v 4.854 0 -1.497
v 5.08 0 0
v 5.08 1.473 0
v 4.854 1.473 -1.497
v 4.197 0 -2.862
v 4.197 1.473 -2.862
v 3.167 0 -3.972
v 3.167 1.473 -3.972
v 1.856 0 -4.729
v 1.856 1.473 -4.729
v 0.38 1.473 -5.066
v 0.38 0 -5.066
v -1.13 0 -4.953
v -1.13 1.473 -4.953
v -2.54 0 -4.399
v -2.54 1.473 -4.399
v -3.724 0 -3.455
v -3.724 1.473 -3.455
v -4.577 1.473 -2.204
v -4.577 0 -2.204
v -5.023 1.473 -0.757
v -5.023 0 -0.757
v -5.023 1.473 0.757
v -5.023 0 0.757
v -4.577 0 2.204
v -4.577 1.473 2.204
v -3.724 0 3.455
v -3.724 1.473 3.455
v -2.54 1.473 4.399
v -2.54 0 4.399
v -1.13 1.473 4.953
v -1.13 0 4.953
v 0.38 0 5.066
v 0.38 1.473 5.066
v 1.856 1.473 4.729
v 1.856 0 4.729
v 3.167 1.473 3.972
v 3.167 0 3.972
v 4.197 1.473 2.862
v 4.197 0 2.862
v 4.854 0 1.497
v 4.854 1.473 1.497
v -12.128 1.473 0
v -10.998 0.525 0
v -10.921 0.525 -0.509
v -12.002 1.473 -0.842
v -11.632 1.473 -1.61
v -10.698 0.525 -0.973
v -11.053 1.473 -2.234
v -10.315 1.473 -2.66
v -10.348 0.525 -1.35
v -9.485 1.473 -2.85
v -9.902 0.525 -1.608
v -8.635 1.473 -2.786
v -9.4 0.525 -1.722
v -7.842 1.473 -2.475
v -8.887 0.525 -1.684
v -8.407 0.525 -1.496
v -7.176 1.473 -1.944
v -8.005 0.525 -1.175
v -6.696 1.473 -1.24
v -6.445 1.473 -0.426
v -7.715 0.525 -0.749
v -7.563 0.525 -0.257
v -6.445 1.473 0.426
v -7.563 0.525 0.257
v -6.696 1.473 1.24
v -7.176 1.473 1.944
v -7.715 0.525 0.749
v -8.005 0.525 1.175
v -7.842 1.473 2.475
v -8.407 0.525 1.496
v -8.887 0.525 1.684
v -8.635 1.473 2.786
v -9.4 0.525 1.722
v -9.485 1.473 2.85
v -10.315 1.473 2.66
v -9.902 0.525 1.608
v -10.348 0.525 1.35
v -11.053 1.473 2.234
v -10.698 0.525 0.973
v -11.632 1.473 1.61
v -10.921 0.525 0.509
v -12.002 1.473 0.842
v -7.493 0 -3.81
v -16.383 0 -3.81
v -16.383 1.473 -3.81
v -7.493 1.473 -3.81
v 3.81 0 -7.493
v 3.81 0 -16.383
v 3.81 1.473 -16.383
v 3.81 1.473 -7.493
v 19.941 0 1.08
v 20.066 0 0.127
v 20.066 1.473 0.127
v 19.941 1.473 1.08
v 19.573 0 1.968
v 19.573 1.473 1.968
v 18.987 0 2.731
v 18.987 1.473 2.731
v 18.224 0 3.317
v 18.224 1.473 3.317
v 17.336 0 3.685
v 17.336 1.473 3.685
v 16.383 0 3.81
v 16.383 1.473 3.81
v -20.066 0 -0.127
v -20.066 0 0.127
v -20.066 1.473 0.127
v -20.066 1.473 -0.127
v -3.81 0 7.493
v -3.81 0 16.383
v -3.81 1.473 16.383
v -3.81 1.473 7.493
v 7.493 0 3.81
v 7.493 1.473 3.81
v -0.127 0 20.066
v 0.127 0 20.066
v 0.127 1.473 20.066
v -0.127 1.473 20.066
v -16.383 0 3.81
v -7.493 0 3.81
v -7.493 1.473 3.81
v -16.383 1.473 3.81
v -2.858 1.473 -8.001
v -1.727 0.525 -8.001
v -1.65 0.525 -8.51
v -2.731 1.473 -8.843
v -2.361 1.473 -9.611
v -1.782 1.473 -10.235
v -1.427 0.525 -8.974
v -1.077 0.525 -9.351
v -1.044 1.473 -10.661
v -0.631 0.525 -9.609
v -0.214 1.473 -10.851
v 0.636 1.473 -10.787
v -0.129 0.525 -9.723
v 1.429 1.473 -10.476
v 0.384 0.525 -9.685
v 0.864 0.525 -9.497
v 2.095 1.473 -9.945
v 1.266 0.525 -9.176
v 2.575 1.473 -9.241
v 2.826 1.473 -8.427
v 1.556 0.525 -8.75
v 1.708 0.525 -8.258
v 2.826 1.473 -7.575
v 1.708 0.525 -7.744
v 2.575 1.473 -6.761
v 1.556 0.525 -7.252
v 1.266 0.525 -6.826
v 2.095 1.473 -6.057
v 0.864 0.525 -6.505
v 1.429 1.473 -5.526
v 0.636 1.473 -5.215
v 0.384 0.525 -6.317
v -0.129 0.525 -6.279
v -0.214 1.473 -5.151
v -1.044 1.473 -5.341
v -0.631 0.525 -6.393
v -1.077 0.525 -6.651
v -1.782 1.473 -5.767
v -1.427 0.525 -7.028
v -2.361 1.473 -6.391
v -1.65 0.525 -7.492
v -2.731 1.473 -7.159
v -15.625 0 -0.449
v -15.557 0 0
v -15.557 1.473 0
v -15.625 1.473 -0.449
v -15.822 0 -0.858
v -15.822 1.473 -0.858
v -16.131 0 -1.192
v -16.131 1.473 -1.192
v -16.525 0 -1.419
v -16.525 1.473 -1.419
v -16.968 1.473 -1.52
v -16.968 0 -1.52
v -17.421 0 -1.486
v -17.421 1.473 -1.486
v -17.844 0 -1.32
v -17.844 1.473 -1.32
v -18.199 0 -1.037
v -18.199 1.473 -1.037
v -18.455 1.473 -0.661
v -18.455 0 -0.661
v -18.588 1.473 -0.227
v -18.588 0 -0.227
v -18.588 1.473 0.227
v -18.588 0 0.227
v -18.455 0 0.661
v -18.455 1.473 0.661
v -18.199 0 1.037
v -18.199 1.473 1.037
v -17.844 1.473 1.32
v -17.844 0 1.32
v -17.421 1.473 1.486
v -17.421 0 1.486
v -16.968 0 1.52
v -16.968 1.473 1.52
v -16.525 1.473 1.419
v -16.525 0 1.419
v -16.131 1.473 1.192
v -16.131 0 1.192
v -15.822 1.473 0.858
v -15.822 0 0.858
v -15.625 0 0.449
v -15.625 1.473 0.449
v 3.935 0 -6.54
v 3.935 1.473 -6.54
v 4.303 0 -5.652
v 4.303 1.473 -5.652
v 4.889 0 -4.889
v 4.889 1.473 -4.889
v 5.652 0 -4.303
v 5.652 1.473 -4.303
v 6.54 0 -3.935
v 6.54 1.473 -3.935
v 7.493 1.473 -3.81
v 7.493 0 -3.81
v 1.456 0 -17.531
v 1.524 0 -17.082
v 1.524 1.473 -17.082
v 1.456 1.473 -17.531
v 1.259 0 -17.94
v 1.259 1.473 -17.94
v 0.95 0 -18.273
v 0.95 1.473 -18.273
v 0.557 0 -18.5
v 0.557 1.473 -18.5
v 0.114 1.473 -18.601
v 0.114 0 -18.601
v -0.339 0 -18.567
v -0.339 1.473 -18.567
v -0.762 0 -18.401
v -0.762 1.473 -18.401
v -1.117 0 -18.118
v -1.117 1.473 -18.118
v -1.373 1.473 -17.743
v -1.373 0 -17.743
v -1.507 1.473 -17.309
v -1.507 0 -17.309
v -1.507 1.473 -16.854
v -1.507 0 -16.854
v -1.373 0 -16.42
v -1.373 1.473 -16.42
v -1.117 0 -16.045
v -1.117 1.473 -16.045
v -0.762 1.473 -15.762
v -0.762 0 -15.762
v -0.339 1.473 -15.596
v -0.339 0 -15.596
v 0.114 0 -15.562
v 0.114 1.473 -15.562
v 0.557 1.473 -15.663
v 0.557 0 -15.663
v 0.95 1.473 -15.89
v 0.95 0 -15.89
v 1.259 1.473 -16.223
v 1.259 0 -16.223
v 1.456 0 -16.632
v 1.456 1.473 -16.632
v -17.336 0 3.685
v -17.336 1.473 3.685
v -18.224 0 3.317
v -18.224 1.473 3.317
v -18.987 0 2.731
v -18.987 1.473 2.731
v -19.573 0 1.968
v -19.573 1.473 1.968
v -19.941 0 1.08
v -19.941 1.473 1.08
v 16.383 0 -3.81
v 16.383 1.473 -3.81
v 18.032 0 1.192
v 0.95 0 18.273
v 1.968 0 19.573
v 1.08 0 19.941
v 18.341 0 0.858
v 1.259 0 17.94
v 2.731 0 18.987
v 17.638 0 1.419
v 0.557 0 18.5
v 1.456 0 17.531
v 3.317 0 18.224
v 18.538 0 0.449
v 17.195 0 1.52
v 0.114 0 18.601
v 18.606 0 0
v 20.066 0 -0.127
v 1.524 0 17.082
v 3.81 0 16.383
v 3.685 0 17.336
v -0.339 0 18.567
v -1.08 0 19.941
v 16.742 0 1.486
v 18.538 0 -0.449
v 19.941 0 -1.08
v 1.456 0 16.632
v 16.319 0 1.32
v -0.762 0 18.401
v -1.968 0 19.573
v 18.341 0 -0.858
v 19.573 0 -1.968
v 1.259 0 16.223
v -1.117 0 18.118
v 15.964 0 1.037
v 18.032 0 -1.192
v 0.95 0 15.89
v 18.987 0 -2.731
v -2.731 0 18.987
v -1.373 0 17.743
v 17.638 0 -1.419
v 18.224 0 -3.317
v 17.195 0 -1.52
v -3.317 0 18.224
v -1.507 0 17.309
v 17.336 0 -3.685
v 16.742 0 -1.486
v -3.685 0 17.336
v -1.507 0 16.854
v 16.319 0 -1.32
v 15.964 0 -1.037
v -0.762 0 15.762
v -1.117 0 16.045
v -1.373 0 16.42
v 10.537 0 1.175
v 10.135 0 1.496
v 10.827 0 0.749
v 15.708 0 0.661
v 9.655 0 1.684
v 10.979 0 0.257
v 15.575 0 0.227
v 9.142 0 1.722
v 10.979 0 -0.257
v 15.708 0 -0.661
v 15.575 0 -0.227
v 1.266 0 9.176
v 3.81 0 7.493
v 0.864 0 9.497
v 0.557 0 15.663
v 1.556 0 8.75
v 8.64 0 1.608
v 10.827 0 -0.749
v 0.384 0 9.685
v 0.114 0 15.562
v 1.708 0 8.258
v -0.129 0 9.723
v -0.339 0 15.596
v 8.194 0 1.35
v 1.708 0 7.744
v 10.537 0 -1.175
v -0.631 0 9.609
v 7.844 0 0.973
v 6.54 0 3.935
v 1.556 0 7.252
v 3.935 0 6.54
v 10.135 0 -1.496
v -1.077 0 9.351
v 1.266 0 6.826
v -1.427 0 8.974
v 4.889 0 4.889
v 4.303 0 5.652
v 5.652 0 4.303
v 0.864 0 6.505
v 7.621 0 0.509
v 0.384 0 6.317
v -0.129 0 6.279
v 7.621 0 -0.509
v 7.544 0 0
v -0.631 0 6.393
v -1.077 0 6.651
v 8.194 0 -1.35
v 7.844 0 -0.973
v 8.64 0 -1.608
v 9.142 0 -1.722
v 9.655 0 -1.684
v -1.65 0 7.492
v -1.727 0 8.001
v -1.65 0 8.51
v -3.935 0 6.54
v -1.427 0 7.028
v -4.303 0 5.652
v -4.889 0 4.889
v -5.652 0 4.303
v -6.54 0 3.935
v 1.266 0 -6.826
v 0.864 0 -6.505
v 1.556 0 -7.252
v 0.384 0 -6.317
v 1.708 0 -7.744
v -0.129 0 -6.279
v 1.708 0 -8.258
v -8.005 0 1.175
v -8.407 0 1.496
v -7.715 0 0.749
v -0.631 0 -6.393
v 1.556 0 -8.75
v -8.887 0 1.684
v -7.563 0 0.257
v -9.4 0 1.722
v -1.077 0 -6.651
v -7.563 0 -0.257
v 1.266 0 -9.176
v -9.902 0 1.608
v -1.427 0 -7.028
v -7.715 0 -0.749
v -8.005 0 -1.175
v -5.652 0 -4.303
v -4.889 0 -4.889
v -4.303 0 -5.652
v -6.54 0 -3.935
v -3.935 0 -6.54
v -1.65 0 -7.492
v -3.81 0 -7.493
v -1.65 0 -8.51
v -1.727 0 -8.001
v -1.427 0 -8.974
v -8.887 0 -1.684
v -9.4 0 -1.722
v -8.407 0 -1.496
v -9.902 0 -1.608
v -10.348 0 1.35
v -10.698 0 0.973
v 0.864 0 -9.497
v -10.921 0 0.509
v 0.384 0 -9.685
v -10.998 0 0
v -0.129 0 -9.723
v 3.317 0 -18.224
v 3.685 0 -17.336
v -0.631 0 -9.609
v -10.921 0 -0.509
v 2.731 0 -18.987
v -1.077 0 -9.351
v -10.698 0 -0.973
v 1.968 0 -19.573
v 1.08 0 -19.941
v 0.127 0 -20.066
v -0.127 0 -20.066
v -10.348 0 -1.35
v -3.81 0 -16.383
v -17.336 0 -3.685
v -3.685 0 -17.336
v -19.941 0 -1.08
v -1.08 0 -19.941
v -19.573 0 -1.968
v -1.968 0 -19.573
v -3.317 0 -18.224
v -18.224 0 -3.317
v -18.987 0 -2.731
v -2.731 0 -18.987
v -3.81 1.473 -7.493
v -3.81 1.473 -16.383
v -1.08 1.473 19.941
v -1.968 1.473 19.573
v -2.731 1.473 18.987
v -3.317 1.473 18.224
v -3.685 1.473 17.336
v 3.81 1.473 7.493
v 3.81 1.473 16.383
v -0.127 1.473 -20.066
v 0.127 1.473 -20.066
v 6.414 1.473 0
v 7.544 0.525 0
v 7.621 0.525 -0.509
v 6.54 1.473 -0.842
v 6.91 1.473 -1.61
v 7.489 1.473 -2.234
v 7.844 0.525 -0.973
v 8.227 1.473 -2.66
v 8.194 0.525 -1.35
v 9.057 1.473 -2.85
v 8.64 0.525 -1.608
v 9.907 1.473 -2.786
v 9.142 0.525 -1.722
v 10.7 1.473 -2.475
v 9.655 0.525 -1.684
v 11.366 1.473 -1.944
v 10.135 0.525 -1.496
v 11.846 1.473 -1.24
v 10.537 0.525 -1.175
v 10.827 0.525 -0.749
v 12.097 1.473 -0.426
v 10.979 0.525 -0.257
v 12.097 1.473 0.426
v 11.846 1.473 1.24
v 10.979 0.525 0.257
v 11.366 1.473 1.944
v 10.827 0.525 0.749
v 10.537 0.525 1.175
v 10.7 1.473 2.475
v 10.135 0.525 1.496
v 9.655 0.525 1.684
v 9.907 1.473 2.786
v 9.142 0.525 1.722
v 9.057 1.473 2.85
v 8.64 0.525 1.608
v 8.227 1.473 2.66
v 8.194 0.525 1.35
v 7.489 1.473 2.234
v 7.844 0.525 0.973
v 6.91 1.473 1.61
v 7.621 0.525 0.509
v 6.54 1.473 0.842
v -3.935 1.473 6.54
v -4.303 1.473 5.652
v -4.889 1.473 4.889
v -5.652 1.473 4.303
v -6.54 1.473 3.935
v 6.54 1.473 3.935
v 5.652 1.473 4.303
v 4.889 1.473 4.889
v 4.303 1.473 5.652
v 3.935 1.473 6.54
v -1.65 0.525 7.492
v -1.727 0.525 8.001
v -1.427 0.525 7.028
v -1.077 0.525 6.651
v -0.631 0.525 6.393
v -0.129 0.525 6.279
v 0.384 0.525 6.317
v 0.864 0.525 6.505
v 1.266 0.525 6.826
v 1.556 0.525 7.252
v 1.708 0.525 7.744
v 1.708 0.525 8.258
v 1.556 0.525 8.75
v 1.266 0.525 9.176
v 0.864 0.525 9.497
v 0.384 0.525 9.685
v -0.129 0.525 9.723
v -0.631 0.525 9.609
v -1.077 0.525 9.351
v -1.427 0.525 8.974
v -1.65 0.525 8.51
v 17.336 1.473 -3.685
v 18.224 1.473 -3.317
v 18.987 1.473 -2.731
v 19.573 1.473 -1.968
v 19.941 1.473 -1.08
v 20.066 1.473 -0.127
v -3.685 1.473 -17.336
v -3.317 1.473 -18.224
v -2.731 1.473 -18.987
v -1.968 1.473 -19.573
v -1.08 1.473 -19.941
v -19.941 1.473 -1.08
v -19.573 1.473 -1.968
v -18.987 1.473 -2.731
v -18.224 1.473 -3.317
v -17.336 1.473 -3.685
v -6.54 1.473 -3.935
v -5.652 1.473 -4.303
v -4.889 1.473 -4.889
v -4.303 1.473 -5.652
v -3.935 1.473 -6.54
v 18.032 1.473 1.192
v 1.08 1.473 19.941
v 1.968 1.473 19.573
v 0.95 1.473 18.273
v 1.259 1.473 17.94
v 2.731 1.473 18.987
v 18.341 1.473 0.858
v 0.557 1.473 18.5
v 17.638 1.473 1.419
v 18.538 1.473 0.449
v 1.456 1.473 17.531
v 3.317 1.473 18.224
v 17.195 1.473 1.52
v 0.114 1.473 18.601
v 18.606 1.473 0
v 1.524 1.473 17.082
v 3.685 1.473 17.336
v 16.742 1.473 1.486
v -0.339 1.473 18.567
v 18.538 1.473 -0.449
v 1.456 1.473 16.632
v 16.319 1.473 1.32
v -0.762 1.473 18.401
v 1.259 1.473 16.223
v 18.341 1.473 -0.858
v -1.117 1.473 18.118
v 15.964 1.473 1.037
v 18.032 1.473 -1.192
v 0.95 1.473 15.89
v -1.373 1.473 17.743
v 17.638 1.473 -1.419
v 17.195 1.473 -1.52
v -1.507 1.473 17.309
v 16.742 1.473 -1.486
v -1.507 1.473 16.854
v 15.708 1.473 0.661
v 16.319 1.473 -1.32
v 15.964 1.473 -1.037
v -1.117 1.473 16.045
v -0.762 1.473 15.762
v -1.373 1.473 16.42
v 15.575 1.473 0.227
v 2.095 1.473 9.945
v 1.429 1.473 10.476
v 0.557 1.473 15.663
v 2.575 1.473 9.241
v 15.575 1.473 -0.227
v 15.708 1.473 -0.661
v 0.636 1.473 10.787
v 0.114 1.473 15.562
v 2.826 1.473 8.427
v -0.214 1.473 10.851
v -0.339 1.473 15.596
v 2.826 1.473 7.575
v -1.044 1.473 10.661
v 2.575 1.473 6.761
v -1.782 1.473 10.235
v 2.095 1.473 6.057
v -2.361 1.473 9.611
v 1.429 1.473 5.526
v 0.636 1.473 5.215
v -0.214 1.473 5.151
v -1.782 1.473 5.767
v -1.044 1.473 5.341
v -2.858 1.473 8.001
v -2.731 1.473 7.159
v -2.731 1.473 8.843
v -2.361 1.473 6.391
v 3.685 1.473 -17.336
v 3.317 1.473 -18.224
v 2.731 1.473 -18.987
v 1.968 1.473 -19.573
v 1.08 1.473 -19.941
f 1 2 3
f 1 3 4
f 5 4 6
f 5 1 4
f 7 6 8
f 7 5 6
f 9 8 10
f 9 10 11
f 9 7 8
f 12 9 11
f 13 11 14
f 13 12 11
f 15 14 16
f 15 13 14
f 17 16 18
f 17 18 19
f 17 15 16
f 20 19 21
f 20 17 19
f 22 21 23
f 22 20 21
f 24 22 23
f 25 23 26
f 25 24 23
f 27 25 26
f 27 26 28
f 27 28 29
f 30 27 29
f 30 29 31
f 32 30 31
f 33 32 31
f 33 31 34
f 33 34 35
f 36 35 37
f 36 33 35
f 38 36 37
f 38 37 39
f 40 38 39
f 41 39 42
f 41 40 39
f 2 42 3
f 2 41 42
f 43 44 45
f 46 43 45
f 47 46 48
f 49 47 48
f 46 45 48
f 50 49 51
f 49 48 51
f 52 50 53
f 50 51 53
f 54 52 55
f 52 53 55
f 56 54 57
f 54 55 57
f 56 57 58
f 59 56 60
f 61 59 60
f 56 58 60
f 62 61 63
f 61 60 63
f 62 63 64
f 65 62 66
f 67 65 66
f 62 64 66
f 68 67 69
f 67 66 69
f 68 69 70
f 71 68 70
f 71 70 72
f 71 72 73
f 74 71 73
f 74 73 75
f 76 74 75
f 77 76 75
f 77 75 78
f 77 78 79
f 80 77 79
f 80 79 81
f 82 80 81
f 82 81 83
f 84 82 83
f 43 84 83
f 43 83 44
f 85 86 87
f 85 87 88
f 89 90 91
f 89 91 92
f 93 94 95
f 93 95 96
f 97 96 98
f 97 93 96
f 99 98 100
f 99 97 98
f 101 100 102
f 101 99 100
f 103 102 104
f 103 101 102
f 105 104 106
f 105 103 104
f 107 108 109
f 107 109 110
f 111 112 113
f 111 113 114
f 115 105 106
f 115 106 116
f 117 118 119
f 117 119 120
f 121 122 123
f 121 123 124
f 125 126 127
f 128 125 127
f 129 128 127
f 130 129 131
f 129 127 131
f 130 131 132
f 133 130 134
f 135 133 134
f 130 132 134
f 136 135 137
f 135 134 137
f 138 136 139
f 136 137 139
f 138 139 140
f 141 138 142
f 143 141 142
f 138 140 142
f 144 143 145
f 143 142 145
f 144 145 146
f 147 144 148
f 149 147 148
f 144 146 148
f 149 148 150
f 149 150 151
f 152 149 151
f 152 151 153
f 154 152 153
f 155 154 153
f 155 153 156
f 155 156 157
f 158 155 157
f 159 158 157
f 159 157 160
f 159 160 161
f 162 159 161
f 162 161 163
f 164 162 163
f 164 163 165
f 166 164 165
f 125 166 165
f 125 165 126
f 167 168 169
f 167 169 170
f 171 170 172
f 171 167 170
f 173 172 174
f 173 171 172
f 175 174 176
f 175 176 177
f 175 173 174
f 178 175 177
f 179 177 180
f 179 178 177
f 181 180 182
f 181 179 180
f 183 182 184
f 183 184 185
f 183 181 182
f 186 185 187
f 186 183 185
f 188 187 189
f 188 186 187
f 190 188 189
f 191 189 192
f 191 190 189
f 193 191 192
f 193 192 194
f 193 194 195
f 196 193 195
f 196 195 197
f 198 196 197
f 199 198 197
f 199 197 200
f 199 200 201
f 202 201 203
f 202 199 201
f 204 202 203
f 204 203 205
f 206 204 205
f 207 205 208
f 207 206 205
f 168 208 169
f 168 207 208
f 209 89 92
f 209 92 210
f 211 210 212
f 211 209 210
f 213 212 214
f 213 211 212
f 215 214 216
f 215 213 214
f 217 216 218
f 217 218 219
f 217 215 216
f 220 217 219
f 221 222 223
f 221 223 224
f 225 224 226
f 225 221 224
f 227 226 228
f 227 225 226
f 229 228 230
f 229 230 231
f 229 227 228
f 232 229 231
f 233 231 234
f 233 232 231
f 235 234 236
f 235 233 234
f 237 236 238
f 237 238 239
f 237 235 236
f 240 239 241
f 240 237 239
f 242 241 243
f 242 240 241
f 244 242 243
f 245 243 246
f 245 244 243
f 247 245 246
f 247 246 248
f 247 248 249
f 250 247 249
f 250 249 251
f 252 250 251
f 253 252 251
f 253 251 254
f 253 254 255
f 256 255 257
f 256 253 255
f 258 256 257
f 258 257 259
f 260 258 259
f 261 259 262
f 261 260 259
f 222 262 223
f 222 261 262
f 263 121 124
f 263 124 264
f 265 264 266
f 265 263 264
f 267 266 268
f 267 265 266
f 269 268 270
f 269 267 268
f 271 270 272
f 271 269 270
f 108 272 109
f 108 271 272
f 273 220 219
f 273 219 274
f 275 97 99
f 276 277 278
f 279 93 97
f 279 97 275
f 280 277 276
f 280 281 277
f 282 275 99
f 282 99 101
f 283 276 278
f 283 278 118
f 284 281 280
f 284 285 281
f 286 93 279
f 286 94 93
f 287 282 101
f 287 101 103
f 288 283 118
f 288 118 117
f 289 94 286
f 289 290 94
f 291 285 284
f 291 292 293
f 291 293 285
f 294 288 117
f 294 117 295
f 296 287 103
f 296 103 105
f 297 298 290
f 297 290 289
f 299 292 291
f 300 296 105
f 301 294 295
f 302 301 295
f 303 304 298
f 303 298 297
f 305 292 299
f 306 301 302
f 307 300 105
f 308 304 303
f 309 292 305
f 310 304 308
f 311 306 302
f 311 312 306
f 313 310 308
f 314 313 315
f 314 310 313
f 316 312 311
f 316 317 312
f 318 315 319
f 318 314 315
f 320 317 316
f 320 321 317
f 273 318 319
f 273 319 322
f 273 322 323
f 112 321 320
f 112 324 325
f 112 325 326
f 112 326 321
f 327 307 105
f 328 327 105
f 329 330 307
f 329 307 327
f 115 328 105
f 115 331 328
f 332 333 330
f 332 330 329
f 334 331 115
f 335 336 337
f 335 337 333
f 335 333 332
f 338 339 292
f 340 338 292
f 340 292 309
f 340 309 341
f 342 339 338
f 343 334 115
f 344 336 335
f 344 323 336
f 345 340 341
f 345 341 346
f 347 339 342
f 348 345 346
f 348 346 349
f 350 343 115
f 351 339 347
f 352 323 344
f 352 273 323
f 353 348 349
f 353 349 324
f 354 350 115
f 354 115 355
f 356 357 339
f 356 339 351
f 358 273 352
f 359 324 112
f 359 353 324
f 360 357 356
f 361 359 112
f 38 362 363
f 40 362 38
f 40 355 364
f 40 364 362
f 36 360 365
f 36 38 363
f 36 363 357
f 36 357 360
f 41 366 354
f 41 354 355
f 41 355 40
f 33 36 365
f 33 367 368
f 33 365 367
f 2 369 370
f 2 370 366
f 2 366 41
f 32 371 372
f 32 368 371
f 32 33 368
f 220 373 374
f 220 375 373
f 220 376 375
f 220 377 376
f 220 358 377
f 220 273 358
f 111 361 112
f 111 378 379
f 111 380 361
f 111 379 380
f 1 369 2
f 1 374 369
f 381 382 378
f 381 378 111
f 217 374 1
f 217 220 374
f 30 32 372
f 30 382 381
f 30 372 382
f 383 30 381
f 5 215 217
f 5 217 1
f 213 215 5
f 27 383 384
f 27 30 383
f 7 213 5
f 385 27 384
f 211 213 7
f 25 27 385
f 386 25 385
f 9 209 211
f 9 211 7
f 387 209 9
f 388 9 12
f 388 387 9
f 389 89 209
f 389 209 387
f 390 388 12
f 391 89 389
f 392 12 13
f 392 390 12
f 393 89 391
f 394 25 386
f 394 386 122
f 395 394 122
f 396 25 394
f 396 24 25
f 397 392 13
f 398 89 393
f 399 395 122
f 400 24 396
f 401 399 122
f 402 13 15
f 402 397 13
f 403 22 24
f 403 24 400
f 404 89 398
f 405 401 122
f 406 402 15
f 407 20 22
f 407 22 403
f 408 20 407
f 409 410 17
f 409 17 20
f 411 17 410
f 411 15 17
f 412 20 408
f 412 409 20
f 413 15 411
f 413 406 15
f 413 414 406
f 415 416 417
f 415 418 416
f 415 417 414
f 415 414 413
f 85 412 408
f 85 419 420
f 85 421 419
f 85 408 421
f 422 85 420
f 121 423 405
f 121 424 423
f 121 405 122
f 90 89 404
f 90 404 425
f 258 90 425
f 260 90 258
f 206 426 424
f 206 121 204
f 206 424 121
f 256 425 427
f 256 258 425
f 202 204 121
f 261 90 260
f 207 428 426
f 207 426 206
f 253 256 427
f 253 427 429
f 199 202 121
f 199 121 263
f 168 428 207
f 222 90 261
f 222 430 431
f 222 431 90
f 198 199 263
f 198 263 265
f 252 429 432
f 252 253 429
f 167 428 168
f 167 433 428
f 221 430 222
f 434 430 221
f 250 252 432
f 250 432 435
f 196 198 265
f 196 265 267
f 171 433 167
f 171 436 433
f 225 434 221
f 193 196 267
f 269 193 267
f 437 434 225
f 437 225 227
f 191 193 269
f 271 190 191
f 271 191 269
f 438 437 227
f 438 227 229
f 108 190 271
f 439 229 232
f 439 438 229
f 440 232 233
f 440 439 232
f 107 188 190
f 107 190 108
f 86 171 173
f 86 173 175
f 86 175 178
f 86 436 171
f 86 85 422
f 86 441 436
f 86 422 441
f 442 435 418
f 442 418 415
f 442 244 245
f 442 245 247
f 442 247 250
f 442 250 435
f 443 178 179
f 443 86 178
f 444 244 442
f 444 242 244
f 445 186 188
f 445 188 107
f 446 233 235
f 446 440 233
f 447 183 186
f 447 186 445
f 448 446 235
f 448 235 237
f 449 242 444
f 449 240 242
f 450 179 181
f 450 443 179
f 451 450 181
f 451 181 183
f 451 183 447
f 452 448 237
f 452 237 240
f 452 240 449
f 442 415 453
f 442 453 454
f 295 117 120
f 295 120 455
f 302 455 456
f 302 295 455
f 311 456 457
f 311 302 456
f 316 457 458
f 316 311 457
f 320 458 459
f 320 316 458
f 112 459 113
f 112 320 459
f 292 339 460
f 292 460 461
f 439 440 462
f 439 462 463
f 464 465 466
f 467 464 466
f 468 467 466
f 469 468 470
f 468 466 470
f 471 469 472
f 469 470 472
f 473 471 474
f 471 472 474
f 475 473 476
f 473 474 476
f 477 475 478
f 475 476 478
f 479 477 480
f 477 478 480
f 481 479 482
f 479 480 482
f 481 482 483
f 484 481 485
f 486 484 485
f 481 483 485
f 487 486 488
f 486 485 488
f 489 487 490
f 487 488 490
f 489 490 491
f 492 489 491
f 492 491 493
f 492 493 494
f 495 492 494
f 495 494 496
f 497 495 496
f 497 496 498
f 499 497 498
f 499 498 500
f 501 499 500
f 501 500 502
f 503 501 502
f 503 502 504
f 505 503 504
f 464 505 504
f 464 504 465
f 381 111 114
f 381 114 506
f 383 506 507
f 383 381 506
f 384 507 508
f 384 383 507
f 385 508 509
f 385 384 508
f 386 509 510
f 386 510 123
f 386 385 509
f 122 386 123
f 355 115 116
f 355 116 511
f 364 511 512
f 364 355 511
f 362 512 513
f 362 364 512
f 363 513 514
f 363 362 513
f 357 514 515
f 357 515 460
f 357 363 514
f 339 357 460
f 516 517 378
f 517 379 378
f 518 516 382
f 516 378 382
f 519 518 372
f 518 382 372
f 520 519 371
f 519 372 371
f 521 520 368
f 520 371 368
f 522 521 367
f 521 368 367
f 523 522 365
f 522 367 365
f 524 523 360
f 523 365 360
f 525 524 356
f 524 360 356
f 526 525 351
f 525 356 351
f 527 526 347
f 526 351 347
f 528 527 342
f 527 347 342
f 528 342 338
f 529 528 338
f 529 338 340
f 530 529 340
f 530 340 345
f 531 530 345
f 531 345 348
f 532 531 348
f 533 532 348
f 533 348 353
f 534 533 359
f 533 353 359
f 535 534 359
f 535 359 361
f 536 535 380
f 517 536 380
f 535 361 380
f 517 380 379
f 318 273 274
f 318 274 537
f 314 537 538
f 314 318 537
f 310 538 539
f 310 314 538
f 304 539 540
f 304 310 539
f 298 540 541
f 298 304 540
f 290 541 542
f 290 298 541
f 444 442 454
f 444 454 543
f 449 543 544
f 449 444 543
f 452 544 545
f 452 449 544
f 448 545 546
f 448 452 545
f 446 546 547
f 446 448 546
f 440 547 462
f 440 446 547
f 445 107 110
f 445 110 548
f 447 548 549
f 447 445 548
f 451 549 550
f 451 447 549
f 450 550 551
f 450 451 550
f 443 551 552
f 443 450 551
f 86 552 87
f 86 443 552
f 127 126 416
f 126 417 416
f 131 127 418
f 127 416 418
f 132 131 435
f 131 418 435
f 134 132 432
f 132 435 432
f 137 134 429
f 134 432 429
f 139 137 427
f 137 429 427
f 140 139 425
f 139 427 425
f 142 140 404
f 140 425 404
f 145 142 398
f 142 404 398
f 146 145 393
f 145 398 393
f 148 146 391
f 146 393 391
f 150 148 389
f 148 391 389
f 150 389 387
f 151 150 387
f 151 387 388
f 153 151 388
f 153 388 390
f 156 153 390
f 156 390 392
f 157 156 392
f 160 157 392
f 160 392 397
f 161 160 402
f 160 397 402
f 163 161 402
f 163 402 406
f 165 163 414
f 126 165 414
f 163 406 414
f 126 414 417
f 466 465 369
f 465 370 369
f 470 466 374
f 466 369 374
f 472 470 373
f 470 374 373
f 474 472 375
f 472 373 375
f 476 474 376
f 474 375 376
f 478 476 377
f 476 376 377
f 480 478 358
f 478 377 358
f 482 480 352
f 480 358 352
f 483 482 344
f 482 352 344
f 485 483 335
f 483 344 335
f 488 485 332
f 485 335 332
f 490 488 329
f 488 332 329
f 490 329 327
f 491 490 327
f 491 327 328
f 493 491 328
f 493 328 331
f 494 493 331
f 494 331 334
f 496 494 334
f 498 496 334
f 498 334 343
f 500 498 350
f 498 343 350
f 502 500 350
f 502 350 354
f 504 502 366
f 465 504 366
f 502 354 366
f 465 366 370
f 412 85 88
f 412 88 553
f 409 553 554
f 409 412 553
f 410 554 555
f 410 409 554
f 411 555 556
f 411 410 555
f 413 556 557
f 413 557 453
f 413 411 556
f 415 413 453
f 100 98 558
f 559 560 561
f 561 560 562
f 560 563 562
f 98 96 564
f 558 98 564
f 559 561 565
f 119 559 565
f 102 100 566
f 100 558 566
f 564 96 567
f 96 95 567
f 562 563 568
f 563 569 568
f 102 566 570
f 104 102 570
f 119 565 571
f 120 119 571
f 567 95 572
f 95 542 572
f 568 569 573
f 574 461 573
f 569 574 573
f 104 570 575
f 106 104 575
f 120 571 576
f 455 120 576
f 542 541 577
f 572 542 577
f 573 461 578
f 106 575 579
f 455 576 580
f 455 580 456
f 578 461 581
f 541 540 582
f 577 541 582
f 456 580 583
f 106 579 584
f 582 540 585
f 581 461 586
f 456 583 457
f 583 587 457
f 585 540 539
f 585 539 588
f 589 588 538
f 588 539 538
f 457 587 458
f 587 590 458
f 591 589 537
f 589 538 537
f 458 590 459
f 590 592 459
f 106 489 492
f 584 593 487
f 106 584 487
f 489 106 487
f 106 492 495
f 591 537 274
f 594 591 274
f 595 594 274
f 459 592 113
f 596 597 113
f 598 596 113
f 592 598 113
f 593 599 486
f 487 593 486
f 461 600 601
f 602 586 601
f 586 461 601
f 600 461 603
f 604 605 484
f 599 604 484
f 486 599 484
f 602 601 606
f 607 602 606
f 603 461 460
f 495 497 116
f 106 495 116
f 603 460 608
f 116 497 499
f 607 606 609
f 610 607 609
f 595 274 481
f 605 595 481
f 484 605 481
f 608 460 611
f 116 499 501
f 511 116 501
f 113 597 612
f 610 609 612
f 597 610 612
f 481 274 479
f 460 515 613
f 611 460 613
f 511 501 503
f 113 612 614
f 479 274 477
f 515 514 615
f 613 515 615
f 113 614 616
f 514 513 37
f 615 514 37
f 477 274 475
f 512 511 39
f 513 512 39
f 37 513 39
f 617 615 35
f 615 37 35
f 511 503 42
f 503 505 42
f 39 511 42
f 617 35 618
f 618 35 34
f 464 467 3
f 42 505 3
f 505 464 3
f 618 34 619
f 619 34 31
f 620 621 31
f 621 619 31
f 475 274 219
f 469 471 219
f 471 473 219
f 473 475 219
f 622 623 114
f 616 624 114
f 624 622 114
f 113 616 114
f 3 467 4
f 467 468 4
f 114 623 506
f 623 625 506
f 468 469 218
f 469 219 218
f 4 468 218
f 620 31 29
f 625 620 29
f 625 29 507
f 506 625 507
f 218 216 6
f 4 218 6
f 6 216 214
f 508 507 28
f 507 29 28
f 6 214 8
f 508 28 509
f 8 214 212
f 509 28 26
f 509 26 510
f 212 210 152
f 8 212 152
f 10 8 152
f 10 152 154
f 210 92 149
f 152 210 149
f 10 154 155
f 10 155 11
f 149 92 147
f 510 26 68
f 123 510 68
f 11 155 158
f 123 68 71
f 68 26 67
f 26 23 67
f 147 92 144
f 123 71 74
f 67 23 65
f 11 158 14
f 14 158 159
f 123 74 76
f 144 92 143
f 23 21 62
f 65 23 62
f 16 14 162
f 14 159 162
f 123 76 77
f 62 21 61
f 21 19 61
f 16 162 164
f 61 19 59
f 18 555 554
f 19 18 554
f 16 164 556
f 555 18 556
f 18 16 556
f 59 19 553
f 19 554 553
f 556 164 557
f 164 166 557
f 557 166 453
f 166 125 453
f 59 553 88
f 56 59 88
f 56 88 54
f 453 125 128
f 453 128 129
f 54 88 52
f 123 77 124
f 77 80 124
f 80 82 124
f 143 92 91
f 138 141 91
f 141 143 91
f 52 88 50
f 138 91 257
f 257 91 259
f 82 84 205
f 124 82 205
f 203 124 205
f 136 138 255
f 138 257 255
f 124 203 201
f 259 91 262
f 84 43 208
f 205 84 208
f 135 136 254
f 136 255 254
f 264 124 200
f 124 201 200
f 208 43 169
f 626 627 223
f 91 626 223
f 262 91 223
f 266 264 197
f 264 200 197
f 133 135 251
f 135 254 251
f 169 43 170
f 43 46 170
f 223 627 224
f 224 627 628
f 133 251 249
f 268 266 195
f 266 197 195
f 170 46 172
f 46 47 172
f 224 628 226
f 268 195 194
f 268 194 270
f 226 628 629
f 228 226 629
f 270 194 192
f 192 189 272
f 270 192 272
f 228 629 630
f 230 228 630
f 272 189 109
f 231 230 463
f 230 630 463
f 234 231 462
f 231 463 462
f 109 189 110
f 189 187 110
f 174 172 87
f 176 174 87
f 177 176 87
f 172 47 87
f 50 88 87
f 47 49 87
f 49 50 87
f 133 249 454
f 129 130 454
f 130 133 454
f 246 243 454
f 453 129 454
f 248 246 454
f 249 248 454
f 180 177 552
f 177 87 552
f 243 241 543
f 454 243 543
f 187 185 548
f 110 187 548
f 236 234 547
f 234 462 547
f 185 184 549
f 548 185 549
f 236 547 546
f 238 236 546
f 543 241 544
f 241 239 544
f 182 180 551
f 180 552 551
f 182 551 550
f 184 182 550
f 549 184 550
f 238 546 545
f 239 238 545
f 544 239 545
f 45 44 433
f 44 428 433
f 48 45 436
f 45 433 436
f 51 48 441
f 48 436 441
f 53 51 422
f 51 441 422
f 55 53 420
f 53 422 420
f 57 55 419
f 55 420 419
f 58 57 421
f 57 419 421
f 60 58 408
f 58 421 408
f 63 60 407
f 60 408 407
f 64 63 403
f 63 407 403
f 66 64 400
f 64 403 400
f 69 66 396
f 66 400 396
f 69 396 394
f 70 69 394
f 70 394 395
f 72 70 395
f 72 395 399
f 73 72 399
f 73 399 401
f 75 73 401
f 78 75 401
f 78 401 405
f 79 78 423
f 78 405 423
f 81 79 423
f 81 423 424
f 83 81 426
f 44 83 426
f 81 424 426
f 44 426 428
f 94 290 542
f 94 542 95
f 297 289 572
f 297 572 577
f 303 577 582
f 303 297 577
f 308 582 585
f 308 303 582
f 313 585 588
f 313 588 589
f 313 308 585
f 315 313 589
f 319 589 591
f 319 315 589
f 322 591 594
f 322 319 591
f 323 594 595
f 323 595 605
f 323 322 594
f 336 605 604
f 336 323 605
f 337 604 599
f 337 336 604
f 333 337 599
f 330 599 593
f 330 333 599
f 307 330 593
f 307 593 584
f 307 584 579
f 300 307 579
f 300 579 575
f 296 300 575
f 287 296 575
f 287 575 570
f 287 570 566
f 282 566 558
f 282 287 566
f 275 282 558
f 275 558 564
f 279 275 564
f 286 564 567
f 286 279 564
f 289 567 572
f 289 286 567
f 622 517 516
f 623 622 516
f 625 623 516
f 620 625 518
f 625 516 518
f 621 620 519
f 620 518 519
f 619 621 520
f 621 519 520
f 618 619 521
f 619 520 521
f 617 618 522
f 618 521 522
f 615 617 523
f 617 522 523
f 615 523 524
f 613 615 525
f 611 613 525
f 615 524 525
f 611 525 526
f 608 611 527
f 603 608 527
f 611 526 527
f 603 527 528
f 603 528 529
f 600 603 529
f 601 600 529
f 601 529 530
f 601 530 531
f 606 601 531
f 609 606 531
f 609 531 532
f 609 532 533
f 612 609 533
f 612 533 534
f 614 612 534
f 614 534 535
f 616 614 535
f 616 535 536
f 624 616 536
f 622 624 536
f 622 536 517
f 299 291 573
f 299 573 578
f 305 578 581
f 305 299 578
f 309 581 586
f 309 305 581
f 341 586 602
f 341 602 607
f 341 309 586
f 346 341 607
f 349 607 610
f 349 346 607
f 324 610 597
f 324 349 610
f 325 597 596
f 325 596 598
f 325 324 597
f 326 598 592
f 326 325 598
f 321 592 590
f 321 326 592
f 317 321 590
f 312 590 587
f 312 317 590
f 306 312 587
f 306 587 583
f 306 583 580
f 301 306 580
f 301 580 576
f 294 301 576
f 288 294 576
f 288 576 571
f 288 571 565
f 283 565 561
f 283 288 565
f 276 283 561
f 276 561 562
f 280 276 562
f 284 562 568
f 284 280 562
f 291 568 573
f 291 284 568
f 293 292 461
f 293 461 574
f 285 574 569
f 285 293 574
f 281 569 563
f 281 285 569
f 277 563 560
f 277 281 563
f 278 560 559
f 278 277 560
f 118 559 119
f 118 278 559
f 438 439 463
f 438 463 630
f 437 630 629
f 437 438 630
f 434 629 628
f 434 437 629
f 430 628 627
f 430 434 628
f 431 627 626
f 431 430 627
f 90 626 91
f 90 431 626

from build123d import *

# Parameters (mm, degrees)
SKETCH1_R                                         = 5.08
SKETCH1_R_2                                       = 1.524
BOSS_EXTRUDE1_DEPTH                               = 1.4732
CSK_FOR_4_FLAT_HEAD_MACHINE_SCREW_100_D           = 3.4544
CSK_FOR_4_FLAT_HEAD_MACHINE_SCREW_100_DEPTH       = 3.44932
CSK_FOR_4_FLAT_HEAD_MACHINE_SCREW_100_CSINK_D     = 5.715
CSK_FOR_4_FLAT_HEAD_MACHINE_SCREW_100_CSINK_ANGLE = 100
CSK_FOR_4_FLAT_HEAD_MACHINE_SCREW_100_TIP         = 1.037806461


with BuildPart() as part:
    # Sketch1 → Boss-Extrude1 (new body)
    with BuildSketch(Plane(origin=(0, 0, 0), x_dir=(1, 0, 0), z_dir=(0, 1, 0))):
        with BuildLine():
            Line((-3.81, 7.493), (-3.81, 16.383))
            ThreePointArc((-3.81, 16.383), (-2.731274275, 18.987274275), (-0.127, 20.066))
            Line((-0.127, 20.066), (0.127, 20.066))
            ThreePointArc((0.127, 20.066), (2.731274275, 18.987274275), (3.81, 16.383))
            Line((3.81, 16.383), (3.81, 7.493))
            ThreePointArc((3.81, 7.493), (4.888725725, 4.888725725), (7.493, 3.81))
            Line((7.493, 3.81), (16.383, 3.81))
            ThreePointArc((16.383, 3.81), (18.987274275, 2.731274275), (20.066, 0.127))
            Line((20.066, 0.127), (20.066, -0.127))
            ThreePointArc((20.066, -0.127), (18.987274275, -2.731274275), (16.383, -3.81))
            Line((16.383, -3.81), (7.493, -3.81))
            ThreePointArc((7.493, -3.81), (4.888725725, -4.888725725), (3.81, -7.493))
            Line((3.81, -7.493), (3.81, -16.383))
            ThreePointArc((3.81, -16.383), (2.731274275, -18.987274275), (0.127, -20.066))
            Line((0.127, -20.066), (-0.127, -20.066))
            ThreePointArc((-0.127, -20.066), (-2.731274275, -18.987274275), (-3.81, -16.383))
            Line((-3.81, -16.383), (-3.81, -7.493))
            ThreePointArc((-3.81, -7.493), (-4.888725725, -4.888725725), (-7.493, -3.81))
            Line((-7.493, -3.81), (-16.383, -3.81))
            ThreePointArc((-16.383, -3.81), (-18.987274275, -2.731274275), (-20.066, -0.127))
            Line((-20.066, -0.127), (-20.066, 0.127))
            ThreePointArc((-20.066, 0.127), (-18.987274275, 2.731274275), (-16.383, 3.81))
            Line((-16.383, 3.81), (-7.493, 3.81))
            ThreePointArc((-7.493, 3.81), (-4.888725725, 4.888725725), (-3.81, 7.493))
        make_face()
        Circle(SKETCH1_R, mode=Mode.SUBTRACT)
        with Locations((0, 17.0815)):
            Circle(SKETCH1_R_2, mode=Mode.SUBTRACT)
        with Locations((17.0815, 0)):
            Circle(SKETCH1_R_2, mode=Mode.SUBTRACT)
        with Locations((-17.0815, 0)):
            Circle(SKETCH1_R_2, mode=Mode.SUBTRACT)
        with Locations((0, -17.0815)):
            Circle(SKETCH1_R_2, mode=Mode.SUBTRACT)
    extrude(amount=BOSS_EXTRUDE1_DEPTH)

    # CSK for #4 Flat Head Machine Screw (100)2
    with Locations(Plane(origin=(0, 1.4732, 0), x_dir=(1, 0, 0), z_dir=(0, 1, 0))):
        with Locations((0, 8.001), (0, -8.001), (9.271, 0), (-9.271, 0)):
            CounterSinkHole(CSK_FOR_4_FLAT_HEAD_MACHINE_SCREW_100_D / 2, CSK_FOR_4_FLAT_HEAD_MACHINE_SCREW_100_CSINK_D / 2, depth=CSK_FOR_4_FLAT_HEAD_MACHINE_SCREW_100_DEPTH, counter_sink_angle=CSK_FOR_4_FLAT_HEAD_MACHINE_SCREW_100_CSINK_ANGLE)
            with Locations((0, 0, -(CSK_FOR_4_FLAT_HEAD_MACHINE_SCREW_100_DEPTH + CSK_FOR_4_FLAT_HEAD_MACHINE_SCREW_100_TIP / 2))):  # 118° drill point
                Cone(0, CSK_FOR_4_FLAT_HEAD_MACHINE_SCREW_100_D / 2, CSK_FOR_4_FLAT_HEAD_MACHINE_SCREW_100_TIP, mode=Mode.SUBTRACT)


solid = part.part
